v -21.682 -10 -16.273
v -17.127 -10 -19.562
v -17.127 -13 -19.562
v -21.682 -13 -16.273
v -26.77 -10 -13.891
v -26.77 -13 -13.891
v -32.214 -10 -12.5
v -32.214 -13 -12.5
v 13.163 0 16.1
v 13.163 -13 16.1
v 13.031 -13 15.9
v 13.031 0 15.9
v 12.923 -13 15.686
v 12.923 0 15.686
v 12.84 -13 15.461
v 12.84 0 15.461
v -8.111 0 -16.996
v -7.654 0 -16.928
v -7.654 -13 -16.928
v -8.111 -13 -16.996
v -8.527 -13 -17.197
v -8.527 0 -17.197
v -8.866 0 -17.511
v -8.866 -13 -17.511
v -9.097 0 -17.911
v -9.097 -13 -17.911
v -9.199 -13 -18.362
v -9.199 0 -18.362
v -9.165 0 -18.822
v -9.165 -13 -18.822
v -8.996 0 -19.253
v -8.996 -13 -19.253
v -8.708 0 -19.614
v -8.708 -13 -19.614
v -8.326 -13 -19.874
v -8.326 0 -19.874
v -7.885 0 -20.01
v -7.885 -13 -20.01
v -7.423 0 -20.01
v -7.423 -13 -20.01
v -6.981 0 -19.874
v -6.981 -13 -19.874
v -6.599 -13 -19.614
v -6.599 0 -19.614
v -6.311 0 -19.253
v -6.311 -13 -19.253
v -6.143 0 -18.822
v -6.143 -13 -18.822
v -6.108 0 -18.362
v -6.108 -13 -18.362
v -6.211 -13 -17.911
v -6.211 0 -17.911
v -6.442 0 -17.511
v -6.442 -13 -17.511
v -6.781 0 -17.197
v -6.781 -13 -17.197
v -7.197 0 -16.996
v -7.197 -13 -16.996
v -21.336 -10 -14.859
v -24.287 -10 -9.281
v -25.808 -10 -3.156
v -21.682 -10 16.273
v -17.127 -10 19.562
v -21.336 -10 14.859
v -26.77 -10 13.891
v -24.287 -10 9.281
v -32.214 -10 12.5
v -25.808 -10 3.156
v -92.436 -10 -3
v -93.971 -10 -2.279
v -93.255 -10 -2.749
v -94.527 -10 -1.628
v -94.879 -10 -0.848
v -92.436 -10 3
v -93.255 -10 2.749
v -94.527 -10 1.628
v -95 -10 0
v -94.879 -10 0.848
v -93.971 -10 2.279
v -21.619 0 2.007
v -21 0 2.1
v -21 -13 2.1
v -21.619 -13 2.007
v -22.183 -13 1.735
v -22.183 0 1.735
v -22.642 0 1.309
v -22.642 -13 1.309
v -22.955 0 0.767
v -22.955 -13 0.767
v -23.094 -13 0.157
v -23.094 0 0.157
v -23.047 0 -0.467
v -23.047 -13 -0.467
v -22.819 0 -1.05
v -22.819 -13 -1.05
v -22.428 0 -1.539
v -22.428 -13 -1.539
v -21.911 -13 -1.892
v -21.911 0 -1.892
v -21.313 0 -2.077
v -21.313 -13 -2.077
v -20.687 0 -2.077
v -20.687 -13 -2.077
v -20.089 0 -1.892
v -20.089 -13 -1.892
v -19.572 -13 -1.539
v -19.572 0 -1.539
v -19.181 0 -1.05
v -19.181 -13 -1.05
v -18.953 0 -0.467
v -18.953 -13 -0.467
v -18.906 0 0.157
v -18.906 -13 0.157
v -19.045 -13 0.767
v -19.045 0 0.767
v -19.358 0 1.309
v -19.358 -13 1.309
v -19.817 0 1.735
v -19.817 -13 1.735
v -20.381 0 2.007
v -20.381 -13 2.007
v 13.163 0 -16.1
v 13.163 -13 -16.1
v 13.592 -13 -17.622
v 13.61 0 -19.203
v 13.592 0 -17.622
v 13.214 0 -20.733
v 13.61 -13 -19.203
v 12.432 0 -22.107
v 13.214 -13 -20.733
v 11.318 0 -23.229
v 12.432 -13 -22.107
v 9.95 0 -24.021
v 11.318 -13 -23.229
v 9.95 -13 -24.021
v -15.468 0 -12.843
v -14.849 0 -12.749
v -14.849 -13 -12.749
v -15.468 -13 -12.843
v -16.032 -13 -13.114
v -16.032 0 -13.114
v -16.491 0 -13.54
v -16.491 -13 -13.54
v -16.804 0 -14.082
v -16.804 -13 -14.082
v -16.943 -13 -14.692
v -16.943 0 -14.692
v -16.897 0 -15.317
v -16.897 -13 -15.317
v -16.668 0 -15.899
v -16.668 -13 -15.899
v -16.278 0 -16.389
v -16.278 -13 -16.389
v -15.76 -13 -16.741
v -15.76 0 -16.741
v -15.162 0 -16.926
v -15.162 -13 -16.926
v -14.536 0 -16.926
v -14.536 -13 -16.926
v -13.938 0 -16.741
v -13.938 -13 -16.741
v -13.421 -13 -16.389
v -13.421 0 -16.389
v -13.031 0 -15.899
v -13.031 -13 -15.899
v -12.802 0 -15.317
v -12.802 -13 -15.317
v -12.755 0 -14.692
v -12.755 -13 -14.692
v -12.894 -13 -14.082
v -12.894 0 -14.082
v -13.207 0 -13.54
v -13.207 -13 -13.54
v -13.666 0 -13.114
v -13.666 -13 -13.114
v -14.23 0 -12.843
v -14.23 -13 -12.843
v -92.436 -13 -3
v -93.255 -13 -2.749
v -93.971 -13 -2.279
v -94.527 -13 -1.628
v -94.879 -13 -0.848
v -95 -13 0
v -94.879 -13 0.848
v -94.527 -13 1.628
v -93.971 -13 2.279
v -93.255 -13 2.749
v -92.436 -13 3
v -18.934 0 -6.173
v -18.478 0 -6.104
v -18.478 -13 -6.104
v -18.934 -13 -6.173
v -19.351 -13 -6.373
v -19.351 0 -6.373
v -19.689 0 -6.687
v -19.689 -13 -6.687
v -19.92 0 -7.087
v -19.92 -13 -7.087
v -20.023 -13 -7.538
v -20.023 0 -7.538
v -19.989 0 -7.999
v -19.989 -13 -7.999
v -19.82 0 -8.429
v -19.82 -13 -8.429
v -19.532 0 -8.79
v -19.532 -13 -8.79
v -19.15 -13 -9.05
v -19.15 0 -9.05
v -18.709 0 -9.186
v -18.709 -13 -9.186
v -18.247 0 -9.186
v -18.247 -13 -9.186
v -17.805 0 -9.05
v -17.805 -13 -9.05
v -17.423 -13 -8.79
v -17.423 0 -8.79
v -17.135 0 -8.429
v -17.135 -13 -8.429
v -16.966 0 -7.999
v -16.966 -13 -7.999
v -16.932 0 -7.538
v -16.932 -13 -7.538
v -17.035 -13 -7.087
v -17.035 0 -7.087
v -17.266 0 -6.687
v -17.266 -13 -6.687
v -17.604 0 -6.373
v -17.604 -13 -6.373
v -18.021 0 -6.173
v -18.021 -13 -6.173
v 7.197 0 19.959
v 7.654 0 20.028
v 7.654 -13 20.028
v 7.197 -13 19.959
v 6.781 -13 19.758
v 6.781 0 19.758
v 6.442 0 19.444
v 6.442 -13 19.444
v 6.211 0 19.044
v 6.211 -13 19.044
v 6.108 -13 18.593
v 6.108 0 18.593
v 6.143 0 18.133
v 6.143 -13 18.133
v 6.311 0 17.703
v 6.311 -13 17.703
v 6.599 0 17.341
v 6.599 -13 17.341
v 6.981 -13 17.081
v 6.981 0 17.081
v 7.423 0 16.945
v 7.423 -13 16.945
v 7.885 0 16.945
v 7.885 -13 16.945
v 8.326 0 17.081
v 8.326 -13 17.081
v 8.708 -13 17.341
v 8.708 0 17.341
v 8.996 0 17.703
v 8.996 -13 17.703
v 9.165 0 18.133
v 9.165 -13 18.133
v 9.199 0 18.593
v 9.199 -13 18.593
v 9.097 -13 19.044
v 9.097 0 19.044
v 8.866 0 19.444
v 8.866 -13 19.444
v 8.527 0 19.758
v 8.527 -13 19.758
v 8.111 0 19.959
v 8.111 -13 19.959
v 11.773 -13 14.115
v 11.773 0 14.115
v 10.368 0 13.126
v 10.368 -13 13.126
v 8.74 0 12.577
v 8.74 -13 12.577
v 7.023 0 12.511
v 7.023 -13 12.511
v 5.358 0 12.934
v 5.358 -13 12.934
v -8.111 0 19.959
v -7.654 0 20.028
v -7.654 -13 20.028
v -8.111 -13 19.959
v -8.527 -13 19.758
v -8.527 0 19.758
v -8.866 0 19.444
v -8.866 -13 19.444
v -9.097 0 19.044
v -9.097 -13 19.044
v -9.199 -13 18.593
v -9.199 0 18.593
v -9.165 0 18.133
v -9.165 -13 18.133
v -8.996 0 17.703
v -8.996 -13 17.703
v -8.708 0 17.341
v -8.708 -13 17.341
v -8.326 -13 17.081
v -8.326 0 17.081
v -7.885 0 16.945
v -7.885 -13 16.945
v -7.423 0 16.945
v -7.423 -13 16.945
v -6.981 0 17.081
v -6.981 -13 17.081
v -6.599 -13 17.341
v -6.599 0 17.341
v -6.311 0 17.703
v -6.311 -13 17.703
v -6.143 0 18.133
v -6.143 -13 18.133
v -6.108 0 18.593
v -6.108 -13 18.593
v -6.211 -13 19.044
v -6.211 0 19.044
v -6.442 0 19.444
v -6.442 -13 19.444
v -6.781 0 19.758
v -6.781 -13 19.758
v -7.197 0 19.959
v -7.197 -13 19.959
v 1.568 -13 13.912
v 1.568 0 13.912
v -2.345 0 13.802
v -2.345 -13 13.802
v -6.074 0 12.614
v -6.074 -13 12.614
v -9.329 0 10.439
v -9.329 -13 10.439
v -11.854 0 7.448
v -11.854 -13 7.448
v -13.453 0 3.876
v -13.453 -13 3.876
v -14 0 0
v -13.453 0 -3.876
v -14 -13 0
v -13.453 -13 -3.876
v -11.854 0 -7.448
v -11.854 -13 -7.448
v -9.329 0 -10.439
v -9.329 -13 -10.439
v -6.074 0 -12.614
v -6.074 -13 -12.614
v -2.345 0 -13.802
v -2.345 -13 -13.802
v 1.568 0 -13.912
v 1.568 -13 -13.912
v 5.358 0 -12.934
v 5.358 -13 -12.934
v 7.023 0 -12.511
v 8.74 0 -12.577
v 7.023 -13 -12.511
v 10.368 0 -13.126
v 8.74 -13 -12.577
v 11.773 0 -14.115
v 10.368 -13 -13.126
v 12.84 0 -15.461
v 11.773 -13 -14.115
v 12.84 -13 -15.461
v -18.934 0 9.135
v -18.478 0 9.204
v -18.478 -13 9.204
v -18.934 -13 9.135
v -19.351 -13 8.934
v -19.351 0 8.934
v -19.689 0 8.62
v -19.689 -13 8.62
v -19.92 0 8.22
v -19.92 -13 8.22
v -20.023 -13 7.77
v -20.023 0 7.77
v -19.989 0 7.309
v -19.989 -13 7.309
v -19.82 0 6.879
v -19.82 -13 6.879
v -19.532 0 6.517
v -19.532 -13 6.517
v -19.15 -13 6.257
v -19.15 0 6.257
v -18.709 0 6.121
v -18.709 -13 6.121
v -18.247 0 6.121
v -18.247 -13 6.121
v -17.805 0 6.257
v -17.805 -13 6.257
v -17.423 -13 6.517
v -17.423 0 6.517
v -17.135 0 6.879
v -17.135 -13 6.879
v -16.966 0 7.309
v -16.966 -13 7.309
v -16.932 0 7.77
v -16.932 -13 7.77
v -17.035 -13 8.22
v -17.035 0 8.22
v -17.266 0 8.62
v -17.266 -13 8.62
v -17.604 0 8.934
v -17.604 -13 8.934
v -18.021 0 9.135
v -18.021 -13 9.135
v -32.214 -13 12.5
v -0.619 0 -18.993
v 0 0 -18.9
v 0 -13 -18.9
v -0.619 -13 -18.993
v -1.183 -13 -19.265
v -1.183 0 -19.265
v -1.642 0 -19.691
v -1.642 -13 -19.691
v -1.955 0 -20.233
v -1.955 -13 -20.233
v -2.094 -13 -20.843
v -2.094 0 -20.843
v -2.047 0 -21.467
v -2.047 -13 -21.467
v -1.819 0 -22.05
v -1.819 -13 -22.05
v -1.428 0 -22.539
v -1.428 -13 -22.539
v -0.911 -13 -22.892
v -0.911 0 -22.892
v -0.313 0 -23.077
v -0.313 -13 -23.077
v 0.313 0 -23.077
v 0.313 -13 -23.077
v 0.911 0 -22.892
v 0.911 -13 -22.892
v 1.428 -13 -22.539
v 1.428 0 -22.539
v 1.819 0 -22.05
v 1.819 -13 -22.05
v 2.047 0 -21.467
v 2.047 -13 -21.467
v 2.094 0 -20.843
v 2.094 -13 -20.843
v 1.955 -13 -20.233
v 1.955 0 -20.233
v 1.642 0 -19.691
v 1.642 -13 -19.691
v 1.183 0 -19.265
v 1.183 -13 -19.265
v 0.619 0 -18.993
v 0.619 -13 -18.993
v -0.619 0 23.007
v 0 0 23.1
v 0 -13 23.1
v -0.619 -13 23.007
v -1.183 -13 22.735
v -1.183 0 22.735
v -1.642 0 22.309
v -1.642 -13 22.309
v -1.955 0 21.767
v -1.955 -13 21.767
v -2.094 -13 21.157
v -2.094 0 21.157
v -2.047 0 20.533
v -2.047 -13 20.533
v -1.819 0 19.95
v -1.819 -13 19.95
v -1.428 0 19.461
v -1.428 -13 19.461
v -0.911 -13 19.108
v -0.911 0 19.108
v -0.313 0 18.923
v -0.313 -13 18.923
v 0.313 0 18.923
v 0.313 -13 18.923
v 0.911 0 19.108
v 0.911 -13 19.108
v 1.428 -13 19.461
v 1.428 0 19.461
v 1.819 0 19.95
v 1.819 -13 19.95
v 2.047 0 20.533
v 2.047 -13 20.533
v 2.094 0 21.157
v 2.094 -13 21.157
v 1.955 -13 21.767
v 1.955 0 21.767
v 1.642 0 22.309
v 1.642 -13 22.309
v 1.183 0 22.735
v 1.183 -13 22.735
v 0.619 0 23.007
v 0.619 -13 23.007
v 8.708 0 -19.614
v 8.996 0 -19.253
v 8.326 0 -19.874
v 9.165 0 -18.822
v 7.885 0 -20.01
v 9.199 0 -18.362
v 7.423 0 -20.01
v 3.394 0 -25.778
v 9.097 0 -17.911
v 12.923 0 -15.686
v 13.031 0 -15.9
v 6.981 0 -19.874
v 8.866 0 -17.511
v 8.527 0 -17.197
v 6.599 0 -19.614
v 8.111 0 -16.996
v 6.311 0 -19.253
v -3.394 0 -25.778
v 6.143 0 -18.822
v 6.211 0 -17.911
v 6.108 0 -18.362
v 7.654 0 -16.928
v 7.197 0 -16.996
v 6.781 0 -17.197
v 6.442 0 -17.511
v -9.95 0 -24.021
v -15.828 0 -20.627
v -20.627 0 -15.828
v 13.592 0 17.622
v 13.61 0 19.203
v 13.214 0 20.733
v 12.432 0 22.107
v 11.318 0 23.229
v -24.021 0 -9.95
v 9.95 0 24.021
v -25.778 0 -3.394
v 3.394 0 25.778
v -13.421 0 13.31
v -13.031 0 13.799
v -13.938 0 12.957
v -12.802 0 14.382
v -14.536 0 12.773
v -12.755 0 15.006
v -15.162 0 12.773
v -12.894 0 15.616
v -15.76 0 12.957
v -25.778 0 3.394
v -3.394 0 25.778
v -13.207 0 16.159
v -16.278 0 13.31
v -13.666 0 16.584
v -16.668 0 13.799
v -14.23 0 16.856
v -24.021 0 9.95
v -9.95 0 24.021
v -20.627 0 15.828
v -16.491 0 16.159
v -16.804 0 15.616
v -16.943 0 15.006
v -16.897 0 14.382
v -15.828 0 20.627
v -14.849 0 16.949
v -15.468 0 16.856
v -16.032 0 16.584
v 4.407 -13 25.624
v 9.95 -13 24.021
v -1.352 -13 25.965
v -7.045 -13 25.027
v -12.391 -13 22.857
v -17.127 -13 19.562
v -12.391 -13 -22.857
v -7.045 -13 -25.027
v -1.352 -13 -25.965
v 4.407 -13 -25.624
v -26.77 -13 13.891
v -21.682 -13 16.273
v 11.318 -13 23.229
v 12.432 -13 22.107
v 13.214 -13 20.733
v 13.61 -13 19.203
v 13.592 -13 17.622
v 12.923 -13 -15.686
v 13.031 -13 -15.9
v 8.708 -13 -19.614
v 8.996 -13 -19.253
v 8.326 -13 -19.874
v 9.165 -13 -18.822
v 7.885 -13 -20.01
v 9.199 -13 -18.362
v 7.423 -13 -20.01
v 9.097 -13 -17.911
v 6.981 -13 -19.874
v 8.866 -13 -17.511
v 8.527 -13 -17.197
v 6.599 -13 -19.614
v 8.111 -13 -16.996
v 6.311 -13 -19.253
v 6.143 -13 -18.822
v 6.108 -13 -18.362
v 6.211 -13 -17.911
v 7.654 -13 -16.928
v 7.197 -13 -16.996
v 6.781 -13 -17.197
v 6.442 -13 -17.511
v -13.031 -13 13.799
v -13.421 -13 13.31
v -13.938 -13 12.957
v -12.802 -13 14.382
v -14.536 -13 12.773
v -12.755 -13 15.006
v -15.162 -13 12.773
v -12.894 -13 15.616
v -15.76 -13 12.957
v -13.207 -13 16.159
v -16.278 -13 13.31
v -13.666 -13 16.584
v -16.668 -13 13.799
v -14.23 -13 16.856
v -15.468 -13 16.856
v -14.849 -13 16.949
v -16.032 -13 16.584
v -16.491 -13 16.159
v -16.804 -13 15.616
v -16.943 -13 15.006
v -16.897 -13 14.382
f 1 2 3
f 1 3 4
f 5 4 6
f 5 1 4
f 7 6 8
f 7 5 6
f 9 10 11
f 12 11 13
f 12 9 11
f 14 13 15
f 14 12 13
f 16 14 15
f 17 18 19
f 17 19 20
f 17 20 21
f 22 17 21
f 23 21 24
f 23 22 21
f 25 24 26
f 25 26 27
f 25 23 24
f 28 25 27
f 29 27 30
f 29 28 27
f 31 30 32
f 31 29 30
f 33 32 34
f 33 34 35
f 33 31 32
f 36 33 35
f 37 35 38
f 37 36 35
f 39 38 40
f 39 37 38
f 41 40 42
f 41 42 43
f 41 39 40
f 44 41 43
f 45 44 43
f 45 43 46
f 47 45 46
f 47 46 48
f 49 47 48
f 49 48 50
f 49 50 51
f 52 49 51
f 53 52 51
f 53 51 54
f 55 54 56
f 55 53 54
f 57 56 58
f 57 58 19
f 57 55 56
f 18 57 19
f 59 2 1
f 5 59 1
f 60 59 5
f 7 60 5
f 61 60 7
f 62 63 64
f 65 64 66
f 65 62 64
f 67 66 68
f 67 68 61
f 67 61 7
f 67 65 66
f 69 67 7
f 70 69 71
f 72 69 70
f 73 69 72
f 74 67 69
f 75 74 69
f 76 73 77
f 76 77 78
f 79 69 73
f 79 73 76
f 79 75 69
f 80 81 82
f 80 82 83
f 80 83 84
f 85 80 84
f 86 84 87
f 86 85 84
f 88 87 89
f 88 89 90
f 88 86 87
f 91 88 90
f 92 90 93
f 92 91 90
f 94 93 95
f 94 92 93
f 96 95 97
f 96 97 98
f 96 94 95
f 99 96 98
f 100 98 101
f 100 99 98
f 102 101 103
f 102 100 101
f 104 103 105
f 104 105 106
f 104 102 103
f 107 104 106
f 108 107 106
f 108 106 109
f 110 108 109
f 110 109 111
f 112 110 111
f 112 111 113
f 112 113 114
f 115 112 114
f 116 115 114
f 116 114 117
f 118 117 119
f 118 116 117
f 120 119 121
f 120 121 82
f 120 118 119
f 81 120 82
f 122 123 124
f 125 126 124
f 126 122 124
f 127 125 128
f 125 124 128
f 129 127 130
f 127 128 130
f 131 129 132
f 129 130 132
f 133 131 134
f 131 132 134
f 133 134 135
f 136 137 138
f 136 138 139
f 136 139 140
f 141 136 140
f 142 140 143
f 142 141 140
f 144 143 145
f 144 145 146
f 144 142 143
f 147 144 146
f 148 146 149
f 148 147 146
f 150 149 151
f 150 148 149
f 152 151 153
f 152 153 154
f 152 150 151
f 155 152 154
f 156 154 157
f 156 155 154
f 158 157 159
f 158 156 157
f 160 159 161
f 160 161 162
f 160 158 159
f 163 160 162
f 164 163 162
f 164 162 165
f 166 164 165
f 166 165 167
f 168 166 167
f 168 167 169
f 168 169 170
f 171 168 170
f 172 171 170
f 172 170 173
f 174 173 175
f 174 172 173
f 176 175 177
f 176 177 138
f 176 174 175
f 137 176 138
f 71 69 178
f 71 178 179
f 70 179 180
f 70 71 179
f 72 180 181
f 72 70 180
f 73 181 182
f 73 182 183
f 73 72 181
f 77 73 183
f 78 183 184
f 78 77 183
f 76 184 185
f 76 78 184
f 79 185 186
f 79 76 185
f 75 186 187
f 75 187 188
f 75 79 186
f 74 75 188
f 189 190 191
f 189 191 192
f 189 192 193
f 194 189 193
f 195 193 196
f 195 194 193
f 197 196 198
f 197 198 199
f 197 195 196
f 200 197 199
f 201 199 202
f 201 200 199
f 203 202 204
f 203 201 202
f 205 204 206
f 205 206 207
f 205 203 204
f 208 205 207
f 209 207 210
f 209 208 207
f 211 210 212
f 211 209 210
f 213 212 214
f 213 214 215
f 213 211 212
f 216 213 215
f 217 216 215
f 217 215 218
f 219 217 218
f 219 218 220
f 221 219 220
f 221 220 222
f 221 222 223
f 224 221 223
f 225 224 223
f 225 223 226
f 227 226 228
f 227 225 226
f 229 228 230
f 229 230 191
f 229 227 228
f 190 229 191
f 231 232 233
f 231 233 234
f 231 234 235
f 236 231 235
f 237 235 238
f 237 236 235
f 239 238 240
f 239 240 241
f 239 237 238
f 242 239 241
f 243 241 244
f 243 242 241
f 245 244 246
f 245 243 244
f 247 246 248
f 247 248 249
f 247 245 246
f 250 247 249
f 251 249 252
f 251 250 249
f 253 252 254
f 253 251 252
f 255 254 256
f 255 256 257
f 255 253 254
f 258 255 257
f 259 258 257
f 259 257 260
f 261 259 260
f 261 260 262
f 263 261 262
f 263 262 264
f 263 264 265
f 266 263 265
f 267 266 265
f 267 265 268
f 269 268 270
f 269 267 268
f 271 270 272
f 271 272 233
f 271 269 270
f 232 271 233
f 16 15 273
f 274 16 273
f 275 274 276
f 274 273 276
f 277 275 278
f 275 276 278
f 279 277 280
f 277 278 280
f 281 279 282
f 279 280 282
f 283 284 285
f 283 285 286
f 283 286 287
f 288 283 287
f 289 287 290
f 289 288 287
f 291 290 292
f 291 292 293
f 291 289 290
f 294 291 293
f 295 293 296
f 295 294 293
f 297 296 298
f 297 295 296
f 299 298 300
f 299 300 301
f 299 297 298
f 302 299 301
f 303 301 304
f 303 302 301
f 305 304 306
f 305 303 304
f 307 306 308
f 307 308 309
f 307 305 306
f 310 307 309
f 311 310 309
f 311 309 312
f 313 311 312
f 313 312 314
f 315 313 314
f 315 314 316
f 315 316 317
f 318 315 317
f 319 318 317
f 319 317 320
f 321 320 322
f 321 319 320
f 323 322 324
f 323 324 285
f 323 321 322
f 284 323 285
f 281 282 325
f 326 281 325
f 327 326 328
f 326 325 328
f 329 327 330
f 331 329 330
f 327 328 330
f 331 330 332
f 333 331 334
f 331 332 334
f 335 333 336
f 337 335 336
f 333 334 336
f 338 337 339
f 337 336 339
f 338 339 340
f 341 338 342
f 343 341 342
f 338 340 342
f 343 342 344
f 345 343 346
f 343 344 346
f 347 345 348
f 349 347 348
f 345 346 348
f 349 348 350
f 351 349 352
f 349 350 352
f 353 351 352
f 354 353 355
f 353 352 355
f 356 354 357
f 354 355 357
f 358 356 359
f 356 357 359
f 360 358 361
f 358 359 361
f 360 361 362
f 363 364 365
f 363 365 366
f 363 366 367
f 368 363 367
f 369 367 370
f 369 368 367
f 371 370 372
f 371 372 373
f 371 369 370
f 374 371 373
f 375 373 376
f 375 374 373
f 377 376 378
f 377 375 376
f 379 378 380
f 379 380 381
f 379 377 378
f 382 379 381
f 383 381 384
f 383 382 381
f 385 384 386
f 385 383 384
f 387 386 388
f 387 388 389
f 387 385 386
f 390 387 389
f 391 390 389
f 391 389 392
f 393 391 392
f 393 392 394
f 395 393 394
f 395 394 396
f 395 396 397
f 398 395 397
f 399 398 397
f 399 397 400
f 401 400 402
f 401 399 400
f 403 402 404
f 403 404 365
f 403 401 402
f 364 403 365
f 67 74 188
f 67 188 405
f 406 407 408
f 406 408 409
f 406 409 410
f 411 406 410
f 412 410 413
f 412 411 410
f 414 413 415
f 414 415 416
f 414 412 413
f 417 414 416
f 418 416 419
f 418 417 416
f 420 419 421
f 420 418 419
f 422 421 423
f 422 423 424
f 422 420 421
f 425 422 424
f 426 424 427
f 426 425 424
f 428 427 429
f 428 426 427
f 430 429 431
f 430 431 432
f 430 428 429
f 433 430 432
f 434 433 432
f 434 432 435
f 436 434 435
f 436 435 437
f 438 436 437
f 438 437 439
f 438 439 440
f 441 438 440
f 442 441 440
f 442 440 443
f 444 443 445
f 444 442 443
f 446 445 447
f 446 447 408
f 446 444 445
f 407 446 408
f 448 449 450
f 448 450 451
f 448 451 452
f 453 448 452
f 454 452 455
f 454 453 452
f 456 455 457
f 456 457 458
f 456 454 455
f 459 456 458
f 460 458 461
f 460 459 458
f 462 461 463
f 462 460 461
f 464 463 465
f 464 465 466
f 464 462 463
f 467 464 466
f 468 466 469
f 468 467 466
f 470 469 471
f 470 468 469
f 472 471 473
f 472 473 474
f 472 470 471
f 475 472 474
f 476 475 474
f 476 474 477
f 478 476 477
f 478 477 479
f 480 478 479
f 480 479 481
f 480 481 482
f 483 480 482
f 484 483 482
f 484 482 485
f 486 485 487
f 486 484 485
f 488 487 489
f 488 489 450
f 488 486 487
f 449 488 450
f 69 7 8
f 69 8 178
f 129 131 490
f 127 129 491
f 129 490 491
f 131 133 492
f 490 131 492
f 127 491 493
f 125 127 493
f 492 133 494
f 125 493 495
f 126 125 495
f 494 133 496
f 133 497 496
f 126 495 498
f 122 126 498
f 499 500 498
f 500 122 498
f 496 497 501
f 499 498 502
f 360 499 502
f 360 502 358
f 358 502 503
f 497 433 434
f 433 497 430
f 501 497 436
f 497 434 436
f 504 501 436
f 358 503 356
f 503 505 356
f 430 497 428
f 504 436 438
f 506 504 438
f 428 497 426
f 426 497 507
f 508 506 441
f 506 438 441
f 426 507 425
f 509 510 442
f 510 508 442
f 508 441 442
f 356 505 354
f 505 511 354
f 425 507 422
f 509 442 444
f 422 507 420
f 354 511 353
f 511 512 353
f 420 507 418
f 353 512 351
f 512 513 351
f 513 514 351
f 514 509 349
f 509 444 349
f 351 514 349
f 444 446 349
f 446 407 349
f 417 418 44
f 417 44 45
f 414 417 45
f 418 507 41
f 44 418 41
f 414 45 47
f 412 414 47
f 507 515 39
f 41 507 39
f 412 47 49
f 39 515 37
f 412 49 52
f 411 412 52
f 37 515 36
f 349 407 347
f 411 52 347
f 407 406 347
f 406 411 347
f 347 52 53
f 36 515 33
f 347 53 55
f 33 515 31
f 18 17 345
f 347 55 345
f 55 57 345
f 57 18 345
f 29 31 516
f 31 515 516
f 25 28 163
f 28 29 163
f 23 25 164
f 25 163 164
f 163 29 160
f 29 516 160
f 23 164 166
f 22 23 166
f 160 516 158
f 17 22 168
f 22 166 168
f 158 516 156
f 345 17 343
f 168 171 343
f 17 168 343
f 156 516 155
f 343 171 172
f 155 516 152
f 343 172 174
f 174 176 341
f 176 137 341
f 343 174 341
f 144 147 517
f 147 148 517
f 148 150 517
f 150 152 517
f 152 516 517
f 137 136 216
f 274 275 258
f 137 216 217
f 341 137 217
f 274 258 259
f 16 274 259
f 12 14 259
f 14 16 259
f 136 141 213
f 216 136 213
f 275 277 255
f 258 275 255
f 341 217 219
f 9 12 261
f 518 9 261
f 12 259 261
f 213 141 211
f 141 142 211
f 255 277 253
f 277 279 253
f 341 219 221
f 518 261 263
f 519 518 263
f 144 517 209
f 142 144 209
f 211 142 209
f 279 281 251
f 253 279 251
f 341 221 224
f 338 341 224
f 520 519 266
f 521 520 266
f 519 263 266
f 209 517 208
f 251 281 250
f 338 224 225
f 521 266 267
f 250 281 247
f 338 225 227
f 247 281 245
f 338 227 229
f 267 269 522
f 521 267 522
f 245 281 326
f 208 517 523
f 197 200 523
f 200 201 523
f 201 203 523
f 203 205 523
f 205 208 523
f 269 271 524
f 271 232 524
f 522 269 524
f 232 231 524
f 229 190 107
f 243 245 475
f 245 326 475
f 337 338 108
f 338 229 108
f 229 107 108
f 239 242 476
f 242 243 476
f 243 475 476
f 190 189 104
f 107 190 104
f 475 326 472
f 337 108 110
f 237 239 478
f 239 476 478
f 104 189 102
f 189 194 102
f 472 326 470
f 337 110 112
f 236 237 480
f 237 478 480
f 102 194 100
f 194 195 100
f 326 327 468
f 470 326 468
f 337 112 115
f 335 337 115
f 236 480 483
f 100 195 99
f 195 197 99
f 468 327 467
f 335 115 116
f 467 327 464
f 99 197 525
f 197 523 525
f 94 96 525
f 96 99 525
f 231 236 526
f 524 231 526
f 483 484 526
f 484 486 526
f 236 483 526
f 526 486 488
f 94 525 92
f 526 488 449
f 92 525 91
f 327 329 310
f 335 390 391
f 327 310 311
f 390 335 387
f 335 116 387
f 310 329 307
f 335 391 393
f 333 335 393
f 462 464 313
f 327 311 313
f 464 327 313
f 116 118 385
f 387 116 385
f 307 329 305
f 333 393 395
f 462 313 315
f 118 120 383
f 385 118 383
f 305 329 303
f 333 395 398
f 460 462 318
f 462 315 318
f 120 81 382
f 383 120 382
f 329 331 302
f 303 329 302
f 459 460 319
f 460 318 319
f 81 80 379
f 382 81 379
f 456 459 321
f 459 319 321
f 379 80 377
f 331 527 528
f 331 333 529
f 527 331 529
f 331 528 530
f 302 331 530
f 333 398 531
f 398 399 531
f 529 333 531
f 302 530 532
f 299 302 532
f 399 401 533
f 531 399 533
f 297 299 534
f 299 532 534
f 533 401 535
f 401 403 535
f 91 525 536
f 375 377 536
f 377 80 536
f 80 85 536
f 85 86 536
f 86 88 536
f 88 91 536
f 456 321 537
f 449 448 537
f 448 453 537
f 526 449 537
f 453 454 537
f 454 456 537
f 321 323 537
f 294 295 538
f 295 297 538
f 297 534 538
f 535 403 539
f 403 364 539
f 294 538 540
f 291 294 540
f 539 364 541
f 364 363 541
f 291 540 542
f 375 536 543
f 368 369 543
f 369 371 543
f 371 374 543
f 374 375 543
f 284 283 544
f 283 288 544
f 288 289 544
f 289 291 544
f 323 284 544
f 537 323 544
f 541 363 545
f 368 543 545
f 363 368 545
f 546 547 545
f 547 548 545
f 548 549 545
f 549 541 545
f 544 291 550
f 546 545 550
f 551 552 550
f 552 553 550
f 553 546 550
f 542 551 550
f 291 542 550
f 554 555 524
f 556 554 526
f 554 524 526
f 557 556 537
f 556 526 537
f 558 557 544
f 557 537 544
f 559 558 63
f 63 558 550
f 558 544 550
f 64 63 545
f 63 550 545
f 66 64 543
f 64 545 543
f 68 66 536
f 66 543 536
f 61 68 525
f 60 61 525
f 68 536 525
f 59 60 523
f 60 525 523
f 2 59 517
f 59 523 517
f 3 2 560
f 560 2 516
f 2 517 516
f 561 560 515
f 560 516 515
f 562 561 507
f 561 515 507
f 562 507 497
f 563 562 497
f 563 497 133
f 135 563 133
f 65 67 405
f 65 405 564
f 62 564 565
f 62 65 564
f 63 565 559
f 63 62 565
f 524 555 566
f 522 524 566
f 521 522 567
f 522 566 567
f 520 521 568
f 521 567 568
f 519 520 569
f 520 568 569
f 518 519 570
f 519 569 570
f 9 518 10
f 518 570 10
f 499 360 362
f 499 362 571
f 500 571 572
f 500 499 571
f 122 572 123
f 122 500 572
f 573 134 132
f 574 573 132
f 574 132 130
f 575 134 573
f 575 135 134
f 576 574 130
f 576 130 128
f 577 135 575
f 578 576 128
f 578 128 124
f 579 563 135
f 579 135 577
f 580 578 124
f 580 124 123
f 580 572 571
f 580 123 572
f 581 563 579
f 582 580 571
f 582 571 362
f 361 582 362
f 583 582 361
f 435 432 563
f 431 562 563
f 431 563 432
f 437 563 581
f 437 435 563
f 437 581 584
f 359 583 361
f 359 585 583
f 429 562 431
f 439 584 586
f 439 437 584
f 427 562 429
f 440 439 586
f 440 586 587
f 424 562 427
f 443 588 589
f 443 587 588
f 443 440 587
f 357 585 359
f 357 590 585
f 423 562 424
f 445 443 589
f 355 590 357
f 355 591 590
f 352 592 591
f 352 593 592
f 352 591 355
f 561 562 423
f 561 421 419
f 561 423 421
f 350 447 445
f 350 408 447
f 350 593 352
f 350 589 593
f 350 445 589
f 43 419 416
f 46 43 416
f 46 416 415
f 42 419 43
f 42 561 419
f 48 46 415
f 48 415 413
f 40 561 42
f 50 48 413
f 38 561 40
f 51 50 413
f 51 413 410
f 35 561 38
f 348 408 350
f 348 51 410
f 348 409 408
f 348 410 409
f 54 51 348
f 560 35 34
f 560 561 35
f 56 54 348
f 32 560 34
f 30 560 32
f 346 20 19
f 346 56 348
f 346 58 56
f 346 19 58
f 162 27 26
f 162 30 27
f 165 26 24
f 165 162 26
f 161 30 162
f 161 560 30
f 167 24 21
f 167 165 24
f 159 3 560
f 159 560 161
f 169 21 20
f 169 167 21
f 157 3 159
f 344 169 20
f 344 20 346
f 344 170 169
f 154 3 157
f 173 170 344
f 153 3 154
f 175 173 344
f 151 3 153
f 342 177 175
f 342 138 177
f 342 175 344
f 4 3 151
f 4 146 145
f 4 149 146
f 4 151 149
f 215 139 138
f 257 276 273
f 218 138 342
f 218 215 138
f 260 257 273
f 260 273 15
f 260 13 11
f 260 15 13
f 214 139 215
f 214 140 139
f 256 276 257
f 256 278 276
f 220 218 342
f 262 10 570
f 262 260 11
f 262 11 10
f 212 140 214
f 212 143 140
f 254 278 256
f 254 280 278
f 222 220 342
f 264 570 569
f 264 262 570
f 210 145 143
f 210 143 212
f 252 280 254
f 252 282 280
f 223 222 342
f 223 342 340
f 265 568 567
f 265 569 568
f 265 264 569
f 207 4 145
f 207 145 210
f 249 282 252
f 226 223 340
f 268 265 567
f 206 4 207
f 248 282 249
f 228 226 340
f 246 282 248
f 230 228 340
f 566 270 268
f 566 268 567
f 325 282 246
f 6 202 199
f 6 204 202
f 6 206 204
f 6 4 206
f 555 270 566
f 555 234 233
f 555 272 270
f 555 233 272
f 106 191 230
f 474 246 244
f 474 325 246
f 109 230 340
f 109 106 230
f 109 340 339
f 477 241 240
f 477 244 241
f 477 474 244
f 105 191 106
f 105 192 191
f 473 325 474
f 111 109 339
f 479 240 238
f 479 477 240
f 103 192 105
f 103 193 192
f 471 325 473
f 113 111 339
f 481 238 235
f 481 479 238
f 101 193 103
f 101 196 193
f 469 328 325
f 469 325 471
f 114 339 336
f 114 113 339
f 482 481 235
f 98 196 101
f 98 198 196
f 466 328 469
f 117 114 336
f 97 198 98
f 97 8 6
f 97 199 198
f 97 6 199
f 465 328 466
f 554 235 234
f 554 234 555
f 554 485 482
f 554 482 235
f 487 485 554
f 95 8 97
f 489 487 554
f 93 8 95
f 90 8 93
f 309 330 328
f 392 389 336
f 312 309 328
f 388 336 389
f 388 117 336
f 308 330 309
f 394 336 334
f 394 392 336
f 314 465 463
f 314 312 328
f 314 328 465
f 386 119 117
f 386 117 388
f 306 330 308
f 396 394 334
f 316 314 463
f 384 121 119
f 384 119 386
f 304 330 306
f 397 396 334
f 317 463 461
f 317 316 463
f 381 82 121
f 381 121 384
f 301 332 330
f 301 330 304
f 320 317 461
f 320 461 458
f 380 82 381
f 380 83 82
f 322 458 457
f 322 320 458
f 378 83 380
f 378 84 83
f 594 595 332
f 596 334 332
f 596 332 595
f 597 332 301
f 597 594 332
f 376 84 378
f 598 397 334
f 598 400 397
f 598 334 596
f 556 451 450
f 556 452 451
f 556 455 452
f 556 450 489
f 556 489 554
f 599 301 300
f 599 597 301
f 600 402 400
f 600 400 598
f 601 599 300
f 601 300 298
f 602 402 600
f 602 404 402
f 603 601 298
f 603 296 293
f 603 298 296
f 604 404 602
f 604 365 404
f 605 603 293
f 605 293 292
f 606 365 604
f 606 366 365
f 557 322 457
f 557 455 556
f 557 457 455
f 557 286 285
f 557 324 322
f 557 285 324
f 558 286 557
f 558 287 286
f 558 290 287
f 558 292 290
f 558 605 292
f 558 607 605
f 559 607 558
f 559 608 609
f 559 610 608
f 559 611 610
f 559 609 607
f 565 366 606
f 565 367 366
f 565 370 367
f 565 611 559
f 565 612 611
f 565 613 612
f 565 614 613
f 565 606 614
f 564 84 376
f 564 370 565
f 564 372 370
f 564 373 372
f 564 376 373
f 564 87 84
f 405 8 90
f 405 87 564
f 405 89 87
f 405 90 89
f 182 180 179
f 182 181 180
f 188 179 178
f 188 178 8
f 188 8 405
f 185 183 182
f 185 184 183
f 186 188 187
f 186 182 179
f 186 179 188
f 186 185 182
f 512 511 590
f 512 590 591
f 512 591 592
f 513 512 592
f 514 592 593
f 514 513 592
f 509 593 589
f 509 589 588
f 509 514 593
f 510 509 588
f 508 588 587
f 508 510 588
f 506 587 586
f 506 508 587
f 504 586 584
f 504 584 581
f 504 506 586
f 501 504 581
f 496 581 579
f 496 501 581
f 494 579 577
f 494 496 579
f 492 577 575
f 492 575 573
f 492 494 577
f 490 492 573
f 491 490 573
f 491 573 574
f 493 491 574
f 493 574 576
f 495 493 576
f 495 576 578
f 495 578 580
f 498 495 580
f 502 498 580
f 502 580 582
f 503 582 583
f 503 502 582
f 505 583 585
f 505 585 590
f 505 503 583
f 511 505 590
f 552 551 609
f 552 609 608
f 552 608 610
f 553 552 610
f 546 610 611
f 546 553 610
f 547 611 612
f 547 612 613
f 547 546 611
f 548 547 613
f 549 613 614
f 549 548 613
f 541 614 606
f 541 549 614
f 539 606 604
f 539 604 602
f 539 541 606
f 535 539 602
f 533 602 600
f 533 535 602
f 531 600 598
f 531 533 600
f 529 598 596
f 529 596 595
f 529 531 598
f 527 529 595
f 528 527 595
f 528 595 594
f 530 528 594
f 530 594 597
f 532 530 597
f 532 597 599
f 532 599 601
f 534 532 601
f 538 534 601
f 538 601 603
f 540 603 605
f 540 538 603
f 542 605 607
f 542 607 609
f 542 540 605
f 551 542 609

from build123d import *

# Parameters (mm, degrees)
SKETCH4_R           = 26
SKETCH4_R_2         = 2.1
SKETCH4_R_3         = 1.55
BOSS_EXTRUDE1_DEPTH = 13
SKETCH5_OUTSIDE_W   = 68.936
SKETCH5_OUTSIDE_H   = 68.936
CUT_EXTRUDE1_DEPTH  = 40
BOSS_EXTRUDE2_START = -3
BOSS_EXTRUDE2_DEPTH = 3


with BuildPart() as part:
    # Sketch4 → Boss-Extrude1 (new body)
    with BuildSketch(Plane(origin=(0, 0, 3), x_dir=(1, 0, 0), z_dir=(0, -1, 0))):
        with Locations(Location((0, -3, 0), (0, 0, 90))):
            Circle(SKETCH4_R)
        with Locations(Location((0, 18, 0), (0, 0, 90))):
            Circle(SKETCH4_R_2, mode=Mode.SUBTRACT)
        with Locations(Location((7.653668647, 15.47759065, 0), (0, 0, 90))):
            Circle(SKETCH4_R_3, mode=Mode.SUBTRACT)
        with Locations(Location((14.849242405, 11.849242405, 0), (0, 0, 90))):
            Circle(SKETCH4_R_2, mode=Mode.SUBTRACT)
        with Locations(Location((18.47759065, 4.653668647, 0), (0, 0, 90))):
            Circle(SKETCH4_R_3, mode=Mode.SUBTRACT)
        with Locations(Location((21, -3, 0), (0, 0, 90))):
            Circle(SKETCH4_R_2, mode=Mode.SUBTRACT)
        with Locations(Location((18.47759065, -10.653668647, 0), (0, 0, 90))):
            Circle(SKETCH4_R_3, mode=Mode.SUBTRACT)
        with Locations(Location((14.849242405, -17.849242405, 0), (0, 0, 90))):
            Circle(SKETCH4_R_2, mode=Mode.SUBTRACT)
        with Locations(Location((7.653668647, -21.47759065, 0), (0, 0, 90))):
            Circle(SKETCH4_R_3, mode=Mode.SUBTRACT)
        with Locations(Location((0, -24, 0), (0, 0, 90))):
            Circle(SKETCH4_R_2, mode=Mode.SUBTRACT)
        with Locations(Location((-7.653668647, -21.47759065, 0), (0, 0, 90))):
            Circle(SKETCH4_R_3, mode=Mode.SUBTRACT)
        with Locations(Location((-14.849242405, -17.849242405, 0), (0, 0, 90))):
            Circle(SKETCH4_R_2, mode=Mode.SUBTRACT)
        with Locations(Location((-18.47759065, -10.653668647, 0), (0, 0, 90))):
            Circle(SKETCH4_R_3, mode=Mode.SUBTRACT)
        with Locations(Location((-21, -3, 0), (0, 0, 90))):
            Circle(SKETCH4_R_2, mode=Mode.SUBTRACT)
        with Locations(Location((-18.47759065, 4.653668647, 0), (0, 0, 90))):
            Circle(SKETCH4_R_3, mode=Mode.SUBTRACT)
        with Locations(Location((-14.849242405, 11.849242405, 0), (0, 0, 90))):
            Circle(SKETCH4_R_2, mode=Mode.SUBTRACT)
        with Locations(Location((-7.653668647, 15.47759065, 0), (0, 0, 90))):
            Circle(SKETCH4_R_3, mode=Mode.SUBTRACT)
    extrude(amount=BOSS_EXTRUDE1_DEPTH)

    # Sketch5 outside → Cut-Extrude1 (cut, through all)
    with BuildSketch(Plane.XZ.offset(13)):
        Rectangle(SKETCH5_OUTSIDE_W, SKETCH5_OUTSIDE_H)
        with BuildLine():
            ThreePointArc((5.357568053, 12.934313455), (-14, 0), (5.357568053, -12.934313455))
            ThreePointArc((5.357568053, -12.934313455), (13.196945842, -16.181490056), (9.949769241, -24.020867845))
            ThreePointArc((9.949769241, -24.020867845), (-26, 0), (9.949769241, 24.020867845))
            ThreePointArc((9.949769241, 24.020867845), (13.196945842, 16.181490056), (5.357568053, 12.934313455))
        make_face(mode=Mode.SUBTRACT)
    extrude(amount=-CUT_EXTRUDE1_DEPTH, mode=Mode.SUBTRACT)

    # Sketch6 → Boss-Extrude2 (add)
    with BuildSketch(Plane.XZ.offset(13).offset(BOSS_EXTRUDE2_START)):
        with BuildLine():
            Line((-92.43614906, 3), (-32.213868088, 12.5))
            ThreePointArc((-32.213868088, 12.5), (-24.170350504, 14.962836151), (-17.126817214, 19.562007364))
            ThreePointArc((-17.126817214, 19.562007364), (-26, 0), (-17.126817214, -19.562007364))
            ThreePointArc((-17.126817214, -19.562007364), (-24.170350504, -14.962836151), (-32.213868088, -12.5))
            Line((-32.213868088, -12.5), (-92.43614906, -3))
            ThreePointArc((-92.43614906, -3), (-95, 0), (-92.43614906, 3))
        make_face()
    extrude(amount=BOSS_EXTRUDE2_DEPTH)


solid = part.part
